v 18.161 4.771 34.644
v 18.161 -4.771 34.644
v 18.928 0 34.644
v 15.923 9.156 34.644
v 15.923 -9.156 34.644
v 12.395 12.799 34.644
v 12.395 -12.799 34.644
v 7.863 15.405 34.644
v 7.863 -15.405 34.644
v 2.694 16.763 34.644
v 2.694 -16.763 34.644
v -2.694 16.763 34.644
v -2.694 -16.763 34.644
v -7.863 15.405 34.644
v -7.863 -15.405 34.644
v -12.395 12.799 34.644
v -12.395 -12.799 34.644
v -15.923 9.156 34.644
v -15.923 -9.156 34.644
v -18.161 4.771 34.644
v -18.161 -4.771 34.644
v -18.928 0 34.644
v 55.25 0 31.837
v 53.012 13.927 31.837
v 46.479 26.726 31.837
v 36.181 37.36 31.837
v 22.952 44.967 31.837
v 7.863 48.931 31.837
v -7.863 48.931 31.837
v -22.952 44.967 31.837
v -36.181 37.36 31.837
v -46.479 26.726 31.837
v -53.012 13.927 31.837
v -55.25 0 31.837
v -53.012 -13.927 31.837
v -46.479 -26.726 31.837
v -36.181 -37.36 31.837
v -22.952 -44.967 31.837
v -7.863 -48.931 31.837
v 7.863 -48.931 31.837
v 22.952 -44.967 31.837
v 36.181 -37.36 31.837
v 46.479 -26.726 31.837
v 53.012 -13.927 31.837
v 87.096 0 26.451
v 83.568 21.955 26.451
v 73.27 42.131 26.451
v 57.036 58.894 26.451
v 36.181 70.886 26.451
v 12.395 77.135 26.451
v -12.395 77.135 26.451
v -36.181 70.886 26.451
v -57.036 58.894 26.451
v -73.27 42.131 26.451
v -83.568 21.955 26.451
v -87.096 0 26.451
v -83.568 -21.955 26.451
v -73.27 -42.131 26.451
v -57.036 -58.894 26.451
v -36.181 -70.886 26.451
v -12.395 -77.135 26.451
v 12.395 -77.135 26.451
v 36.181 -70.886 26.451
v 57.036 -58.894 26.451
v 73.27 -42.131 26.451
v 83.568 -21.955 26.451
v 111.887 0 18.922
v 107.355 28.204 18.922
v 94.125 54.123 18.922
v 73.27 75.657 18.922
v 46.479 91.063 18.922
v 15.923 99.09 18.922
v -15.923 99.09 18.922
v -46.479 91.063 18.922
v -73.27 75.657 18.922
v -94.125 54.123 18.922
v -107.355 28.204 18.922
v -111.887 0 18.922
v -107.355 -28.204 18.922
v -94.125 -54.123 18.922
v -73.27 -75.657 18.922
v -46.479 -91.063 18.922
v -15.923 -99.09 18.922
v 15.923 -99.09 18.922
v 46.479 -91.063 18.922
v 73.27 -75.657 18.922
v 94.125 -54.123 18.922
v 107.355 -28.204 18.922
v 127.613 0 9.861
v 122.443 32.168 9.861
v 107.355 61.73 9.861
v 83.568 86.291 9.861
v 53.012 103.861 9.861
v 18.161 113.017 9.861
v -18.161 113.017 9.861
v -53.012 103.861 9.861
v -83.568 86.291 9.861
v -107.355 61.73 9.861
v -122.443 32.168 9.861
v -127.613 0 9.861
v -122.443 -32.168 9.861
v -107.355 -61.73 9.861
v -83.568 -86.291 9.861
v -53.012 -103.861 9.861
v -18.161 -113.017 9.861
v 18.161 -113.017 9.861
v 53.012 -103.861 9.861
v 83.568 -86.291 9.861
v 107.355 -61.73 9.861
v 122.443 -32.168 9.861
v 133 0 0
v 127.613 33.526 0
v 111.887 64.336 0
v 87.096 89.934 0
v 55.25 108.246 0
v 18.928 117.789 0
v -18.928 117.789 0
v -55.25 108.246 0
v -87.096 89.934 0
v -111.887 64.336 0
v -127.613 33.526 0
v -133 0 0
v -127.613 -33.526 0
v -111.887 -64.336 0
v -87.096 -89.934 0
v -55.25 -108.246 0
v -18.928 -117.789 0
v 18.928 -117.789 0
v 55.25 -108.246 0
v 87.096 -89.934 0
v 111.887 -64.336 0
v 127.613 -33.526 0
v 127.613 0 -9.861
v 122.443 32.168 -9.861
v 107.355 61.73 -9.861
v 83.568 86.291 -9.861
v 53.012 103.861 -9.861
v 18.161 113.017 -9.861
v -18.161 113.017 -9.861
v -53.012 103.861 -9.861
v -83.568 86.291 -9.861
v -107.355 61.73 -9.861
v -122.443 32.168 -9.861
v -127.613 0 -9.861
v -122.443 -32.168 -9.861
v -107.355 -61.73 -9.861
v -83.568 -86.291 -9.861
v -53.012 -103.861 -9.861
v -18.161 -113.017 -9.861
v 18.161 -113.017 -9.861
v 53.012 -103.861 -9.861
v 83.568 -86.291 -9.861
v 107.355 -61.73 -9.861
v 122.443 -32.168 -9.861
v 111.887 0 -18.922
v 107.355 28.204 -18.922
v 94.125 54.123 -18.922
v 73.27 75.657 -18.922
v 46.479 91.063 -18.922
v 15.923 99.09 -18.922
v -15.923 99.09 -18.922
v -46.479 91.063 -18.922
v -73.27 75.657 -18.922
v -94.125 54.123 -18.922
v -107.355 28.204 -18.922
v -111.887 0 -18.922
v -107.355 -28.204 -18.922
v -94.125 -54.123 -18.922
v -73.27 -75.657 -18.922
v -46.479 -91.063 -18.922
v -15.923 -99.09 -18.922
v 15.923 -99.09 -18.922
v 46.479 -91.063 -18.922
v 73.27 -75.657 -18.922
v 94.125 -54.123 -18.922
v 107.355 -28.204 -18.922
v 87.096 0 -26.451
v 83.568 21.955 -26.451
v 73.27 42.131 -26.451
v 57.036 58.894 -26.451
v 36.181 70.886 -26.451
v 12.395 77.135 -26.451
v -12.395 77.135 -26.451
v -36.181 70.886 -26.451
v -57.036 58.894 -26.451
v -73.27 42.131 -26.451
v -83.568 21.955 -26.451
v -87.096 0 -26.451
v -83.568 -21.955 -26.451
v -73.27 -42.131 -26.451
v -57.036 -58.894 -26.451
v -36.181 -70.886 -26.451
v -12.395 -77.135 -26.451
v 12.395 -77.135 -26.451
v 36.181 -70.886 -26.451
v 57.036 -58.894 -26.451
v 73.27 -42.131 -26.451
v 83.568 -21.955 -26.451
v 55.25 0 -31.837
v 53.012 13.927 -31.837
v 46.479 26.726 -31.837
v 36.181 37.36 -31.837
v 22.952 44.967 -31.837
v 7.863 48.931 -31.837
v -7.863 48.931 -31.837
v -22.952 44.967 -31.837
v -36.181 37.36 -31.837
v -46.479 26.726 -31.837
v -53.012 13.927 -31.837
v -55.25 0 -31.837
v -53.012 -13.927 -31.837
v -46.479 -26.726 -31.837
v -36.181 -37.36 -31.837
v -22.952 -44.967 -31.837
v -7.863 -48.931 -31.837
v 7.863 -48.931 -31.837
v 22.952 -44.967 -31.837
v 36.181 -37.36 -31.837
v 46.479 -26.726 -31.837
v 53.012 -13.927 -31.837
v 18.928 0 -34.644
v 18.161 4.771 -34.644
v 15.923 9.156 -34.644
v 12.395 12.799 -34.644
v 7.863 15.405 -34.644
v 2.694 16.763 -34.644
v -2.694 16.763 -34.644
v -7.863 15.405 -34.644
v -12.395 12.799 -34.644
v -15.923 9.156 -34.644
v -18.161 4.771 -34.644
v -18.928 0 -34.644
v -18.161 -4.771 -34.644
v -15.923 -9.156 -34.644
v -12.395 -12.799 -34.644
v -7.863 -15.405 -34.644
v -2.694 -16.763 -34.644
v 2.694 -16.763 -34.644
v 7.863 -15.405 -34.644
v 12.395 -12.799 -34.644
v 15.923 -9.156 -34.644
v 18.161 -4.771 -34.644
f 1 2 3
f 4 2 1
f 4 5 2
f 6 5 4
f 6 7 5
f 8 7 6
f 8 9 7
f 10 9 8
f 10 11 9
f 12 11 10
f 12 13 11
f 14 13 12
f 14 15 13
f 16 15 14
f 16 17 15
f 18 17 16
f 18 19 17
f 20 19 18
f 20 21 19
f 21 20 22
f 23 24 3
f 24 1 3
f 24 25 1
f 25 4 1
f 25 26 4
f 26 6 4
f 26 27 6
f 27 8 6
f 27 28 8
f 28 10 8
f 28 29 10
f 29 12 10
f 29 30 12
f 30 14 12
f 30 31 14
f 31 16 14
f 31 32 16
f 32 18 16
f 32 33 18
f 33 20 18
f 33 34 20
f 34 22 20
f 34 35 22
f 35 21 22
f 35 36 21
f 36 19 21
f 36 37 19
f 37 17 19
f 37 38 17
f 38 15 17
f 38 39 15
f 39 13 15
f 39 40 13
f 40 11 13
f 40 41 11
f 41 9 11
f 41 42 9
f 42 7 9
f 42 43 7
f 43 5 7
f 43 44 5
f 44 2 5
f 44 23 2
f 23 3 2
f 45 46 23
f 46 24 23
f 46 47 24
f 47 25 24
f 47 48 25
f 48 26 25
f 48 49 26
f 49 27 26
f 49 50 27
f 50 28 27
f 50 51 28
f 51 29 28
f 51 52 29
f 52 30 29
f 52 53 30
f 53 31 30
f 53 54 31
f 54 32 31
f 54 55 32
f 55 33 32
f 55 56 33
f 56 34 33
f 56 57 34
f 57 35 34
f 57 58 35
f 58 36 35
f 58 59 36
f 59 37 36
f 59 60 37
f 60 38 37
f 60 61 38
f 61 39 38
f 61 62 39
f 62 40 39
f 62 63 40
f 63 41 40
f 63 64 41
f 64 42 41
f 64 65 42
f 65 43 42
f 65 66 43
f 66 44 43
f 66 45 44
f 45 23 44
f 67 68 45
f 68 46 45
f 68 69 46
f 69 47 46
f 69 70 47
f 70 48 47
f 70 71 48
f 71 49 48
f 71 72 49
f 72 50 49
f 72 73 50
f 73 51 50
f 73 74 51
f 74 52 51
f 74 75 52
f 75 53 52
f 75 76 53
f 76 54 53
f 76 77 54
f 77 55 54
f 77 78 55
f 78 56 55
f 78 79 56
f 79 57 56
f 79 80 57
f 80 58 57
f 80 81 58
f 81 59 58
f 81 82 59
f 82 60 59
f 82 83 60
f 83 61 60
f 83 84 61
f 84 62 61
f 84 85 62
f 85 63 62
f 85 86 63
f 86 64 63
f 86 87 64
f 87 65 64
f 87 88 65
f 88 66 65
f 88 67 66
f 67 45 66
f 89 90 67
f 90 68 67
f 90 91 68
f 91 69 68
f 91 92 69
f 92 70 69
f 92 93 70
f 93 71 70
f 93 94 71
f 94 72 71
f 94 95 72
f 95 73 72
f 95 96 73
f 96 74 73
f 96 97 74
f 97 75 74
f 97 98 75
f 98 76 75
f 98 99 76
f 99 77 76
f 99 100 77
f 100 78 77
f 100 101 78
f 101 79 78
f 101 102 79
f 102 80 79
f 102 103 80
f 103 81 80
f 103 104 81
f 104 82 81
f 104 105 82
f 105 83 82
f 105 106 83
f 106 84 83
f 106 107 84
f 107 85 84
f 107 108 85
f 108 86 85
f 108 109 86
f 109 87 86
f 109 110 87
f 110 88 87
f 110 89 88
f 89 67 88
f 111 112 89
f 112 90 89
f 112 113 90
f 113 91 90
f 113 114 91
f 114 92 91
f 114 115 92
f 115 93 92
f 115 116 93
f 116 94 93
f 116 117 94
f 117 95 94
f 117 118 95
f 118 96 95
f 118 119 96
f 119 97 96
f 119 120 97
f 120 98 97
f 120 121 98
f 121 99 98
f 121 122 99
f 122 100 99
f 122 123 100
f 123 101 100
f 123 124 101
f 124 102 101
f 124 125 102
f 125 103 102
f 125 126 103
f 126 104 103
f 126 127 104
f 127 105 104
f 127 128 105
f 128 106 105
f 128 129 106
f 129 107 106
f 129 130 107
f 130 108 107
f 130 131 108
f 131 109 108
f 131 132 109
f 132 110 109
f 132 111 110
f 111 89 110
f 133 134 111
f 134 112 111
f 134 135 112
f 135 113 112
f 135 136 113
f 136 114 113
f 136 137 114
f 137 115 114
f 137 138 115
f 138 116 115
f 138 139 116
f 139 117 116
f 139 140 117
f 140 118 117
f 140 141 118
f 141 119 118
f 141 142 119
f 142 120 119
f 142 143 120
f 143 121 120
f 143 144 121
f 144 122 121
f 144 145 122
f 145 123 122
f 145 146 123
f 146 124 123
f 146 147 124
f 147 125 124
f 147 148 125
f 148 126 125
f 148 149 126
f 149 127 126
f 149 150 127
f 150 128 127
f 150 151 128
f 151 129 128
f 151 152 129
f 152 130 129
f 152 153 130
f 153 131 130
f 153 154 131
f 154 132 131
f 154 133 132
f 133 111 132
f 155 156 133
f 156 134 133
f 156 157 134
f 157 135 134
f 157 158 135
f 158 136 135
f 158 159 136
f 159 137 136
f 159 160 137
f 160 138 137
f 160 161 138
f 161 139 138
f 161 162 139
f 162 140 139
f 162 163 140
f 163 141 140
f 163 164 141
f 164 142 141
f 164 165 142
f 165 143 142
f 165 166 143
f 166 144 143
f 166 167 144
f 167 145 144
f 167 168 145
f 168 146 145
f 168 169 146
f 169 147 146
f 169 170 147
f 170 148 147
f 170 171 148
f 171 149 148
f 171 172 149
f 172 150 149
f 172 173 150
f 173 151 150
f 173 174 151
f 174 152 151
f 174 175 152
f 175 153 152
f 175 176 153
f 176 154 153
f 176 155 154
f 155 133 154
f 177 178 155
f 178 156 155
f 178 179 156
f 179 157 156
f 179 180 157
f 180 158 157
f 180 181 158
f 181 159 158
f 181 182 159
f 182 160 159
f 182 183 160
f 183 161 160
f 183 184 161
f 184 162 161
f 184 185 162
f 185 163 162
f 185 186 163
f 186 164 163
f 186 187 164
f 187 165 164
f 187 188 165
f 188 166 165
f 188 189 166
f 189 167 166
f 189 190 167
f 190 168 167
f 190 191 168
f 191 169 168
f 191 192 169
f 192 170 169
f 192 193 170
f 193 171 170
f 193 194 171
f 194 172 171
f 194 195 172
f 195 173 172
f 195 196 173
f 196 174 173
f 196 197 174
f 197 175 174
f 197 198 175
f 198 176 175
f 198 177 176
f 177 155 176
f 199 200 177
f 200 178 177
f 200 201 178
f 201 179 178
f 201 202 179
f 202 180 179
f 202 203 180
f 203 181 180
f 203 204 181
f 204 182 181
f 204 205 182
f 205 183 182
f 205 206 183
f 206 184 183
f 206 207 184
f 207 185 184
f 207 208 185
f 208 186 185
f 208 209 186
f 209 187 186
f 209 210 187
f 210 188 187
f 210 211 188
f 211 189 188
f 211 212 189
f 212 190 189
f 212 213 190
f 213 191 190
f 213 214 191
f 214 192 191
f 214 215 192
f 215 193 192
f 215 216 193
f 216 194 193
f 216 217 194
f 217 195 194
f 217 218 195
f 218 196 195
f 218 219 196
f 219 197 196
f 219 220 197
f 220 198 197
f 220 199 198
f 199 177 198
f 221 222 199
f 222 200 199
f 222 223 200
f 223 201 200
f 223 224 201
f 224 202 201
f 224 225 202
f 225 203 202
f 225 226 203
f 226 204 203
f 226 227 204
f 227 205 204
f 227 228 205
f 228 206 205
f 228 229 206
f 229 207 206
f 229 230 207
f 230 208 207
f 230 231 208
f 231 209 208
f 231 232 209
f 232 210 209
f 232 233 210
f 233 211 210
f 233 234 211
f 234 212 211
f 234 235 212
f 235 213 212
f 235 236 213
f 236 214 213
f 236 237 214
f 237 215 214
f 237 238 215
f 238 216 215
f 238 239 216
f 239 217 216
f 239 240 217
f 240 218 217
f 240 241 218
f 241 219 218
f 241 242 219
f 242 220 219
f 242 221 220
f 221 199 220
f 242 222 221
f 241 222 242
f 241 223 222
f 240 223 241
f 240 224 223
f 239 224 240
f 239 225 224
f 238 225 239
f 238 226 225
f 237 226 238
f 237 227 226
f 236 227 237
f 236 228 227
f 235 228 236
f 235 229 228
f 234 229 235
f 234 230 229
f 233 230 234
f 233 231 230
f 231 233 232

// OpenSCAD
// Generated by SolidPython 1.0.1 on 2020-07-29 00:46:54


scale(v = [19, 17, 5]) {
	sphere(r = 7);
}
/***********************************************
*********      SolidPython code:      **********
************************************************
 
# import packages: SolidPython
from solid import *
from solid.utils import *
from itertools import chain, combinations, permutations


class Resize:

    def __init__(self, scad_file):
        self.scad_file = scad_file
        #self.scad_file = import_scad(scad_file)
        # cone/cylinder param:
        self.r1 = 0
        self.r2 = 0
        self.h = 0
        # rectangular prism param:
        self.w = 0
        self.l = 0
        # ellipse param:
        self.r = 0

    # import OpenScad code (file name corresponds to shape)


    # classify shape + parameters
    def assign(self, param1, param2, param3):
        if self.scad_file == 'cone.scad':
            self.r1 = param1
            self.r2 = param2
            self.h = param3
        elif self.scad_file == 'cylinder.scad':
            self.r1 = param1
            self.r2 = param2
            self.h = param3
        elif self.scad_file == 'rectangularPrism.scad':
            self.h = param1
            self.l = param2
            self.w = param3
        else:
            self.r = param1
            self.h = param2

    # resize parameters
    def iterate(self):
        x = range(3, 20, 2)
        i = 1
        if self.scad_file == 'cone.scad':
            tempList = list(permutations(x, 2))
            for temp in tempList:
                param1 = temp[0]
                param2 = temp[1]
                filepath = 'produced_scad_files/' + 'cone' + str(param1) + '_' + str(param2) + '_' + '.scad'
                scad_render_to_file(cylinder(h=param1, r1=param2, r2=0), filepath)

        elif self.scad_file == 'cylinder.scad':
            tempList = list(permutations(x, 3))
            for temp in tempList:
                param1 = temp[0]
                param2 = temp[1]
                filepath = 'produced_scad_files/' + 'cylinder' + str(param1) + '_' + str(param2) + '_' + '.scad'
                scad_render_to_file(cylinder(h=param1, r1=param2, r2=param2), filepath)

        elif self.scad_file == 'rectangularPrism.scad':
            tempList = list(permutations(x, 3))
            for temp in tempList:
                param1 = temp[0]
                param2 = temp[1]
                param3 = temp[2]
                filepath = 'produced_scad_files/' + 'rectangularPrism' + str(param1) + '_' + str(param2) + '_' + str(
                    param3) + '.scad'
                scad_render_to_file(cube(size=(param1, param2, param3)), filepath)

        elif self.scad_file == 'ellipse.scad':
            tempList = list(permutations(x, 4))
            for temp in tempList:
                param1 = temp[0]
                param2 = temp[1]
                param3 = temp[2]
                param4 = temp[3]
                filepath = 'produced_scad_files/' + 'ellipse' + str(param1) + '_' + str(param2) + '_' + str(param3) + '_' + str(param4) + '.scad'
                scad_render_to_file(scale([param1, param2, param3])(sphere(r=param4)), filepath)

    def render_to_scadfile(self):
        scad_render_to_file(scad, 'example.scad') 
 
************************************************/
